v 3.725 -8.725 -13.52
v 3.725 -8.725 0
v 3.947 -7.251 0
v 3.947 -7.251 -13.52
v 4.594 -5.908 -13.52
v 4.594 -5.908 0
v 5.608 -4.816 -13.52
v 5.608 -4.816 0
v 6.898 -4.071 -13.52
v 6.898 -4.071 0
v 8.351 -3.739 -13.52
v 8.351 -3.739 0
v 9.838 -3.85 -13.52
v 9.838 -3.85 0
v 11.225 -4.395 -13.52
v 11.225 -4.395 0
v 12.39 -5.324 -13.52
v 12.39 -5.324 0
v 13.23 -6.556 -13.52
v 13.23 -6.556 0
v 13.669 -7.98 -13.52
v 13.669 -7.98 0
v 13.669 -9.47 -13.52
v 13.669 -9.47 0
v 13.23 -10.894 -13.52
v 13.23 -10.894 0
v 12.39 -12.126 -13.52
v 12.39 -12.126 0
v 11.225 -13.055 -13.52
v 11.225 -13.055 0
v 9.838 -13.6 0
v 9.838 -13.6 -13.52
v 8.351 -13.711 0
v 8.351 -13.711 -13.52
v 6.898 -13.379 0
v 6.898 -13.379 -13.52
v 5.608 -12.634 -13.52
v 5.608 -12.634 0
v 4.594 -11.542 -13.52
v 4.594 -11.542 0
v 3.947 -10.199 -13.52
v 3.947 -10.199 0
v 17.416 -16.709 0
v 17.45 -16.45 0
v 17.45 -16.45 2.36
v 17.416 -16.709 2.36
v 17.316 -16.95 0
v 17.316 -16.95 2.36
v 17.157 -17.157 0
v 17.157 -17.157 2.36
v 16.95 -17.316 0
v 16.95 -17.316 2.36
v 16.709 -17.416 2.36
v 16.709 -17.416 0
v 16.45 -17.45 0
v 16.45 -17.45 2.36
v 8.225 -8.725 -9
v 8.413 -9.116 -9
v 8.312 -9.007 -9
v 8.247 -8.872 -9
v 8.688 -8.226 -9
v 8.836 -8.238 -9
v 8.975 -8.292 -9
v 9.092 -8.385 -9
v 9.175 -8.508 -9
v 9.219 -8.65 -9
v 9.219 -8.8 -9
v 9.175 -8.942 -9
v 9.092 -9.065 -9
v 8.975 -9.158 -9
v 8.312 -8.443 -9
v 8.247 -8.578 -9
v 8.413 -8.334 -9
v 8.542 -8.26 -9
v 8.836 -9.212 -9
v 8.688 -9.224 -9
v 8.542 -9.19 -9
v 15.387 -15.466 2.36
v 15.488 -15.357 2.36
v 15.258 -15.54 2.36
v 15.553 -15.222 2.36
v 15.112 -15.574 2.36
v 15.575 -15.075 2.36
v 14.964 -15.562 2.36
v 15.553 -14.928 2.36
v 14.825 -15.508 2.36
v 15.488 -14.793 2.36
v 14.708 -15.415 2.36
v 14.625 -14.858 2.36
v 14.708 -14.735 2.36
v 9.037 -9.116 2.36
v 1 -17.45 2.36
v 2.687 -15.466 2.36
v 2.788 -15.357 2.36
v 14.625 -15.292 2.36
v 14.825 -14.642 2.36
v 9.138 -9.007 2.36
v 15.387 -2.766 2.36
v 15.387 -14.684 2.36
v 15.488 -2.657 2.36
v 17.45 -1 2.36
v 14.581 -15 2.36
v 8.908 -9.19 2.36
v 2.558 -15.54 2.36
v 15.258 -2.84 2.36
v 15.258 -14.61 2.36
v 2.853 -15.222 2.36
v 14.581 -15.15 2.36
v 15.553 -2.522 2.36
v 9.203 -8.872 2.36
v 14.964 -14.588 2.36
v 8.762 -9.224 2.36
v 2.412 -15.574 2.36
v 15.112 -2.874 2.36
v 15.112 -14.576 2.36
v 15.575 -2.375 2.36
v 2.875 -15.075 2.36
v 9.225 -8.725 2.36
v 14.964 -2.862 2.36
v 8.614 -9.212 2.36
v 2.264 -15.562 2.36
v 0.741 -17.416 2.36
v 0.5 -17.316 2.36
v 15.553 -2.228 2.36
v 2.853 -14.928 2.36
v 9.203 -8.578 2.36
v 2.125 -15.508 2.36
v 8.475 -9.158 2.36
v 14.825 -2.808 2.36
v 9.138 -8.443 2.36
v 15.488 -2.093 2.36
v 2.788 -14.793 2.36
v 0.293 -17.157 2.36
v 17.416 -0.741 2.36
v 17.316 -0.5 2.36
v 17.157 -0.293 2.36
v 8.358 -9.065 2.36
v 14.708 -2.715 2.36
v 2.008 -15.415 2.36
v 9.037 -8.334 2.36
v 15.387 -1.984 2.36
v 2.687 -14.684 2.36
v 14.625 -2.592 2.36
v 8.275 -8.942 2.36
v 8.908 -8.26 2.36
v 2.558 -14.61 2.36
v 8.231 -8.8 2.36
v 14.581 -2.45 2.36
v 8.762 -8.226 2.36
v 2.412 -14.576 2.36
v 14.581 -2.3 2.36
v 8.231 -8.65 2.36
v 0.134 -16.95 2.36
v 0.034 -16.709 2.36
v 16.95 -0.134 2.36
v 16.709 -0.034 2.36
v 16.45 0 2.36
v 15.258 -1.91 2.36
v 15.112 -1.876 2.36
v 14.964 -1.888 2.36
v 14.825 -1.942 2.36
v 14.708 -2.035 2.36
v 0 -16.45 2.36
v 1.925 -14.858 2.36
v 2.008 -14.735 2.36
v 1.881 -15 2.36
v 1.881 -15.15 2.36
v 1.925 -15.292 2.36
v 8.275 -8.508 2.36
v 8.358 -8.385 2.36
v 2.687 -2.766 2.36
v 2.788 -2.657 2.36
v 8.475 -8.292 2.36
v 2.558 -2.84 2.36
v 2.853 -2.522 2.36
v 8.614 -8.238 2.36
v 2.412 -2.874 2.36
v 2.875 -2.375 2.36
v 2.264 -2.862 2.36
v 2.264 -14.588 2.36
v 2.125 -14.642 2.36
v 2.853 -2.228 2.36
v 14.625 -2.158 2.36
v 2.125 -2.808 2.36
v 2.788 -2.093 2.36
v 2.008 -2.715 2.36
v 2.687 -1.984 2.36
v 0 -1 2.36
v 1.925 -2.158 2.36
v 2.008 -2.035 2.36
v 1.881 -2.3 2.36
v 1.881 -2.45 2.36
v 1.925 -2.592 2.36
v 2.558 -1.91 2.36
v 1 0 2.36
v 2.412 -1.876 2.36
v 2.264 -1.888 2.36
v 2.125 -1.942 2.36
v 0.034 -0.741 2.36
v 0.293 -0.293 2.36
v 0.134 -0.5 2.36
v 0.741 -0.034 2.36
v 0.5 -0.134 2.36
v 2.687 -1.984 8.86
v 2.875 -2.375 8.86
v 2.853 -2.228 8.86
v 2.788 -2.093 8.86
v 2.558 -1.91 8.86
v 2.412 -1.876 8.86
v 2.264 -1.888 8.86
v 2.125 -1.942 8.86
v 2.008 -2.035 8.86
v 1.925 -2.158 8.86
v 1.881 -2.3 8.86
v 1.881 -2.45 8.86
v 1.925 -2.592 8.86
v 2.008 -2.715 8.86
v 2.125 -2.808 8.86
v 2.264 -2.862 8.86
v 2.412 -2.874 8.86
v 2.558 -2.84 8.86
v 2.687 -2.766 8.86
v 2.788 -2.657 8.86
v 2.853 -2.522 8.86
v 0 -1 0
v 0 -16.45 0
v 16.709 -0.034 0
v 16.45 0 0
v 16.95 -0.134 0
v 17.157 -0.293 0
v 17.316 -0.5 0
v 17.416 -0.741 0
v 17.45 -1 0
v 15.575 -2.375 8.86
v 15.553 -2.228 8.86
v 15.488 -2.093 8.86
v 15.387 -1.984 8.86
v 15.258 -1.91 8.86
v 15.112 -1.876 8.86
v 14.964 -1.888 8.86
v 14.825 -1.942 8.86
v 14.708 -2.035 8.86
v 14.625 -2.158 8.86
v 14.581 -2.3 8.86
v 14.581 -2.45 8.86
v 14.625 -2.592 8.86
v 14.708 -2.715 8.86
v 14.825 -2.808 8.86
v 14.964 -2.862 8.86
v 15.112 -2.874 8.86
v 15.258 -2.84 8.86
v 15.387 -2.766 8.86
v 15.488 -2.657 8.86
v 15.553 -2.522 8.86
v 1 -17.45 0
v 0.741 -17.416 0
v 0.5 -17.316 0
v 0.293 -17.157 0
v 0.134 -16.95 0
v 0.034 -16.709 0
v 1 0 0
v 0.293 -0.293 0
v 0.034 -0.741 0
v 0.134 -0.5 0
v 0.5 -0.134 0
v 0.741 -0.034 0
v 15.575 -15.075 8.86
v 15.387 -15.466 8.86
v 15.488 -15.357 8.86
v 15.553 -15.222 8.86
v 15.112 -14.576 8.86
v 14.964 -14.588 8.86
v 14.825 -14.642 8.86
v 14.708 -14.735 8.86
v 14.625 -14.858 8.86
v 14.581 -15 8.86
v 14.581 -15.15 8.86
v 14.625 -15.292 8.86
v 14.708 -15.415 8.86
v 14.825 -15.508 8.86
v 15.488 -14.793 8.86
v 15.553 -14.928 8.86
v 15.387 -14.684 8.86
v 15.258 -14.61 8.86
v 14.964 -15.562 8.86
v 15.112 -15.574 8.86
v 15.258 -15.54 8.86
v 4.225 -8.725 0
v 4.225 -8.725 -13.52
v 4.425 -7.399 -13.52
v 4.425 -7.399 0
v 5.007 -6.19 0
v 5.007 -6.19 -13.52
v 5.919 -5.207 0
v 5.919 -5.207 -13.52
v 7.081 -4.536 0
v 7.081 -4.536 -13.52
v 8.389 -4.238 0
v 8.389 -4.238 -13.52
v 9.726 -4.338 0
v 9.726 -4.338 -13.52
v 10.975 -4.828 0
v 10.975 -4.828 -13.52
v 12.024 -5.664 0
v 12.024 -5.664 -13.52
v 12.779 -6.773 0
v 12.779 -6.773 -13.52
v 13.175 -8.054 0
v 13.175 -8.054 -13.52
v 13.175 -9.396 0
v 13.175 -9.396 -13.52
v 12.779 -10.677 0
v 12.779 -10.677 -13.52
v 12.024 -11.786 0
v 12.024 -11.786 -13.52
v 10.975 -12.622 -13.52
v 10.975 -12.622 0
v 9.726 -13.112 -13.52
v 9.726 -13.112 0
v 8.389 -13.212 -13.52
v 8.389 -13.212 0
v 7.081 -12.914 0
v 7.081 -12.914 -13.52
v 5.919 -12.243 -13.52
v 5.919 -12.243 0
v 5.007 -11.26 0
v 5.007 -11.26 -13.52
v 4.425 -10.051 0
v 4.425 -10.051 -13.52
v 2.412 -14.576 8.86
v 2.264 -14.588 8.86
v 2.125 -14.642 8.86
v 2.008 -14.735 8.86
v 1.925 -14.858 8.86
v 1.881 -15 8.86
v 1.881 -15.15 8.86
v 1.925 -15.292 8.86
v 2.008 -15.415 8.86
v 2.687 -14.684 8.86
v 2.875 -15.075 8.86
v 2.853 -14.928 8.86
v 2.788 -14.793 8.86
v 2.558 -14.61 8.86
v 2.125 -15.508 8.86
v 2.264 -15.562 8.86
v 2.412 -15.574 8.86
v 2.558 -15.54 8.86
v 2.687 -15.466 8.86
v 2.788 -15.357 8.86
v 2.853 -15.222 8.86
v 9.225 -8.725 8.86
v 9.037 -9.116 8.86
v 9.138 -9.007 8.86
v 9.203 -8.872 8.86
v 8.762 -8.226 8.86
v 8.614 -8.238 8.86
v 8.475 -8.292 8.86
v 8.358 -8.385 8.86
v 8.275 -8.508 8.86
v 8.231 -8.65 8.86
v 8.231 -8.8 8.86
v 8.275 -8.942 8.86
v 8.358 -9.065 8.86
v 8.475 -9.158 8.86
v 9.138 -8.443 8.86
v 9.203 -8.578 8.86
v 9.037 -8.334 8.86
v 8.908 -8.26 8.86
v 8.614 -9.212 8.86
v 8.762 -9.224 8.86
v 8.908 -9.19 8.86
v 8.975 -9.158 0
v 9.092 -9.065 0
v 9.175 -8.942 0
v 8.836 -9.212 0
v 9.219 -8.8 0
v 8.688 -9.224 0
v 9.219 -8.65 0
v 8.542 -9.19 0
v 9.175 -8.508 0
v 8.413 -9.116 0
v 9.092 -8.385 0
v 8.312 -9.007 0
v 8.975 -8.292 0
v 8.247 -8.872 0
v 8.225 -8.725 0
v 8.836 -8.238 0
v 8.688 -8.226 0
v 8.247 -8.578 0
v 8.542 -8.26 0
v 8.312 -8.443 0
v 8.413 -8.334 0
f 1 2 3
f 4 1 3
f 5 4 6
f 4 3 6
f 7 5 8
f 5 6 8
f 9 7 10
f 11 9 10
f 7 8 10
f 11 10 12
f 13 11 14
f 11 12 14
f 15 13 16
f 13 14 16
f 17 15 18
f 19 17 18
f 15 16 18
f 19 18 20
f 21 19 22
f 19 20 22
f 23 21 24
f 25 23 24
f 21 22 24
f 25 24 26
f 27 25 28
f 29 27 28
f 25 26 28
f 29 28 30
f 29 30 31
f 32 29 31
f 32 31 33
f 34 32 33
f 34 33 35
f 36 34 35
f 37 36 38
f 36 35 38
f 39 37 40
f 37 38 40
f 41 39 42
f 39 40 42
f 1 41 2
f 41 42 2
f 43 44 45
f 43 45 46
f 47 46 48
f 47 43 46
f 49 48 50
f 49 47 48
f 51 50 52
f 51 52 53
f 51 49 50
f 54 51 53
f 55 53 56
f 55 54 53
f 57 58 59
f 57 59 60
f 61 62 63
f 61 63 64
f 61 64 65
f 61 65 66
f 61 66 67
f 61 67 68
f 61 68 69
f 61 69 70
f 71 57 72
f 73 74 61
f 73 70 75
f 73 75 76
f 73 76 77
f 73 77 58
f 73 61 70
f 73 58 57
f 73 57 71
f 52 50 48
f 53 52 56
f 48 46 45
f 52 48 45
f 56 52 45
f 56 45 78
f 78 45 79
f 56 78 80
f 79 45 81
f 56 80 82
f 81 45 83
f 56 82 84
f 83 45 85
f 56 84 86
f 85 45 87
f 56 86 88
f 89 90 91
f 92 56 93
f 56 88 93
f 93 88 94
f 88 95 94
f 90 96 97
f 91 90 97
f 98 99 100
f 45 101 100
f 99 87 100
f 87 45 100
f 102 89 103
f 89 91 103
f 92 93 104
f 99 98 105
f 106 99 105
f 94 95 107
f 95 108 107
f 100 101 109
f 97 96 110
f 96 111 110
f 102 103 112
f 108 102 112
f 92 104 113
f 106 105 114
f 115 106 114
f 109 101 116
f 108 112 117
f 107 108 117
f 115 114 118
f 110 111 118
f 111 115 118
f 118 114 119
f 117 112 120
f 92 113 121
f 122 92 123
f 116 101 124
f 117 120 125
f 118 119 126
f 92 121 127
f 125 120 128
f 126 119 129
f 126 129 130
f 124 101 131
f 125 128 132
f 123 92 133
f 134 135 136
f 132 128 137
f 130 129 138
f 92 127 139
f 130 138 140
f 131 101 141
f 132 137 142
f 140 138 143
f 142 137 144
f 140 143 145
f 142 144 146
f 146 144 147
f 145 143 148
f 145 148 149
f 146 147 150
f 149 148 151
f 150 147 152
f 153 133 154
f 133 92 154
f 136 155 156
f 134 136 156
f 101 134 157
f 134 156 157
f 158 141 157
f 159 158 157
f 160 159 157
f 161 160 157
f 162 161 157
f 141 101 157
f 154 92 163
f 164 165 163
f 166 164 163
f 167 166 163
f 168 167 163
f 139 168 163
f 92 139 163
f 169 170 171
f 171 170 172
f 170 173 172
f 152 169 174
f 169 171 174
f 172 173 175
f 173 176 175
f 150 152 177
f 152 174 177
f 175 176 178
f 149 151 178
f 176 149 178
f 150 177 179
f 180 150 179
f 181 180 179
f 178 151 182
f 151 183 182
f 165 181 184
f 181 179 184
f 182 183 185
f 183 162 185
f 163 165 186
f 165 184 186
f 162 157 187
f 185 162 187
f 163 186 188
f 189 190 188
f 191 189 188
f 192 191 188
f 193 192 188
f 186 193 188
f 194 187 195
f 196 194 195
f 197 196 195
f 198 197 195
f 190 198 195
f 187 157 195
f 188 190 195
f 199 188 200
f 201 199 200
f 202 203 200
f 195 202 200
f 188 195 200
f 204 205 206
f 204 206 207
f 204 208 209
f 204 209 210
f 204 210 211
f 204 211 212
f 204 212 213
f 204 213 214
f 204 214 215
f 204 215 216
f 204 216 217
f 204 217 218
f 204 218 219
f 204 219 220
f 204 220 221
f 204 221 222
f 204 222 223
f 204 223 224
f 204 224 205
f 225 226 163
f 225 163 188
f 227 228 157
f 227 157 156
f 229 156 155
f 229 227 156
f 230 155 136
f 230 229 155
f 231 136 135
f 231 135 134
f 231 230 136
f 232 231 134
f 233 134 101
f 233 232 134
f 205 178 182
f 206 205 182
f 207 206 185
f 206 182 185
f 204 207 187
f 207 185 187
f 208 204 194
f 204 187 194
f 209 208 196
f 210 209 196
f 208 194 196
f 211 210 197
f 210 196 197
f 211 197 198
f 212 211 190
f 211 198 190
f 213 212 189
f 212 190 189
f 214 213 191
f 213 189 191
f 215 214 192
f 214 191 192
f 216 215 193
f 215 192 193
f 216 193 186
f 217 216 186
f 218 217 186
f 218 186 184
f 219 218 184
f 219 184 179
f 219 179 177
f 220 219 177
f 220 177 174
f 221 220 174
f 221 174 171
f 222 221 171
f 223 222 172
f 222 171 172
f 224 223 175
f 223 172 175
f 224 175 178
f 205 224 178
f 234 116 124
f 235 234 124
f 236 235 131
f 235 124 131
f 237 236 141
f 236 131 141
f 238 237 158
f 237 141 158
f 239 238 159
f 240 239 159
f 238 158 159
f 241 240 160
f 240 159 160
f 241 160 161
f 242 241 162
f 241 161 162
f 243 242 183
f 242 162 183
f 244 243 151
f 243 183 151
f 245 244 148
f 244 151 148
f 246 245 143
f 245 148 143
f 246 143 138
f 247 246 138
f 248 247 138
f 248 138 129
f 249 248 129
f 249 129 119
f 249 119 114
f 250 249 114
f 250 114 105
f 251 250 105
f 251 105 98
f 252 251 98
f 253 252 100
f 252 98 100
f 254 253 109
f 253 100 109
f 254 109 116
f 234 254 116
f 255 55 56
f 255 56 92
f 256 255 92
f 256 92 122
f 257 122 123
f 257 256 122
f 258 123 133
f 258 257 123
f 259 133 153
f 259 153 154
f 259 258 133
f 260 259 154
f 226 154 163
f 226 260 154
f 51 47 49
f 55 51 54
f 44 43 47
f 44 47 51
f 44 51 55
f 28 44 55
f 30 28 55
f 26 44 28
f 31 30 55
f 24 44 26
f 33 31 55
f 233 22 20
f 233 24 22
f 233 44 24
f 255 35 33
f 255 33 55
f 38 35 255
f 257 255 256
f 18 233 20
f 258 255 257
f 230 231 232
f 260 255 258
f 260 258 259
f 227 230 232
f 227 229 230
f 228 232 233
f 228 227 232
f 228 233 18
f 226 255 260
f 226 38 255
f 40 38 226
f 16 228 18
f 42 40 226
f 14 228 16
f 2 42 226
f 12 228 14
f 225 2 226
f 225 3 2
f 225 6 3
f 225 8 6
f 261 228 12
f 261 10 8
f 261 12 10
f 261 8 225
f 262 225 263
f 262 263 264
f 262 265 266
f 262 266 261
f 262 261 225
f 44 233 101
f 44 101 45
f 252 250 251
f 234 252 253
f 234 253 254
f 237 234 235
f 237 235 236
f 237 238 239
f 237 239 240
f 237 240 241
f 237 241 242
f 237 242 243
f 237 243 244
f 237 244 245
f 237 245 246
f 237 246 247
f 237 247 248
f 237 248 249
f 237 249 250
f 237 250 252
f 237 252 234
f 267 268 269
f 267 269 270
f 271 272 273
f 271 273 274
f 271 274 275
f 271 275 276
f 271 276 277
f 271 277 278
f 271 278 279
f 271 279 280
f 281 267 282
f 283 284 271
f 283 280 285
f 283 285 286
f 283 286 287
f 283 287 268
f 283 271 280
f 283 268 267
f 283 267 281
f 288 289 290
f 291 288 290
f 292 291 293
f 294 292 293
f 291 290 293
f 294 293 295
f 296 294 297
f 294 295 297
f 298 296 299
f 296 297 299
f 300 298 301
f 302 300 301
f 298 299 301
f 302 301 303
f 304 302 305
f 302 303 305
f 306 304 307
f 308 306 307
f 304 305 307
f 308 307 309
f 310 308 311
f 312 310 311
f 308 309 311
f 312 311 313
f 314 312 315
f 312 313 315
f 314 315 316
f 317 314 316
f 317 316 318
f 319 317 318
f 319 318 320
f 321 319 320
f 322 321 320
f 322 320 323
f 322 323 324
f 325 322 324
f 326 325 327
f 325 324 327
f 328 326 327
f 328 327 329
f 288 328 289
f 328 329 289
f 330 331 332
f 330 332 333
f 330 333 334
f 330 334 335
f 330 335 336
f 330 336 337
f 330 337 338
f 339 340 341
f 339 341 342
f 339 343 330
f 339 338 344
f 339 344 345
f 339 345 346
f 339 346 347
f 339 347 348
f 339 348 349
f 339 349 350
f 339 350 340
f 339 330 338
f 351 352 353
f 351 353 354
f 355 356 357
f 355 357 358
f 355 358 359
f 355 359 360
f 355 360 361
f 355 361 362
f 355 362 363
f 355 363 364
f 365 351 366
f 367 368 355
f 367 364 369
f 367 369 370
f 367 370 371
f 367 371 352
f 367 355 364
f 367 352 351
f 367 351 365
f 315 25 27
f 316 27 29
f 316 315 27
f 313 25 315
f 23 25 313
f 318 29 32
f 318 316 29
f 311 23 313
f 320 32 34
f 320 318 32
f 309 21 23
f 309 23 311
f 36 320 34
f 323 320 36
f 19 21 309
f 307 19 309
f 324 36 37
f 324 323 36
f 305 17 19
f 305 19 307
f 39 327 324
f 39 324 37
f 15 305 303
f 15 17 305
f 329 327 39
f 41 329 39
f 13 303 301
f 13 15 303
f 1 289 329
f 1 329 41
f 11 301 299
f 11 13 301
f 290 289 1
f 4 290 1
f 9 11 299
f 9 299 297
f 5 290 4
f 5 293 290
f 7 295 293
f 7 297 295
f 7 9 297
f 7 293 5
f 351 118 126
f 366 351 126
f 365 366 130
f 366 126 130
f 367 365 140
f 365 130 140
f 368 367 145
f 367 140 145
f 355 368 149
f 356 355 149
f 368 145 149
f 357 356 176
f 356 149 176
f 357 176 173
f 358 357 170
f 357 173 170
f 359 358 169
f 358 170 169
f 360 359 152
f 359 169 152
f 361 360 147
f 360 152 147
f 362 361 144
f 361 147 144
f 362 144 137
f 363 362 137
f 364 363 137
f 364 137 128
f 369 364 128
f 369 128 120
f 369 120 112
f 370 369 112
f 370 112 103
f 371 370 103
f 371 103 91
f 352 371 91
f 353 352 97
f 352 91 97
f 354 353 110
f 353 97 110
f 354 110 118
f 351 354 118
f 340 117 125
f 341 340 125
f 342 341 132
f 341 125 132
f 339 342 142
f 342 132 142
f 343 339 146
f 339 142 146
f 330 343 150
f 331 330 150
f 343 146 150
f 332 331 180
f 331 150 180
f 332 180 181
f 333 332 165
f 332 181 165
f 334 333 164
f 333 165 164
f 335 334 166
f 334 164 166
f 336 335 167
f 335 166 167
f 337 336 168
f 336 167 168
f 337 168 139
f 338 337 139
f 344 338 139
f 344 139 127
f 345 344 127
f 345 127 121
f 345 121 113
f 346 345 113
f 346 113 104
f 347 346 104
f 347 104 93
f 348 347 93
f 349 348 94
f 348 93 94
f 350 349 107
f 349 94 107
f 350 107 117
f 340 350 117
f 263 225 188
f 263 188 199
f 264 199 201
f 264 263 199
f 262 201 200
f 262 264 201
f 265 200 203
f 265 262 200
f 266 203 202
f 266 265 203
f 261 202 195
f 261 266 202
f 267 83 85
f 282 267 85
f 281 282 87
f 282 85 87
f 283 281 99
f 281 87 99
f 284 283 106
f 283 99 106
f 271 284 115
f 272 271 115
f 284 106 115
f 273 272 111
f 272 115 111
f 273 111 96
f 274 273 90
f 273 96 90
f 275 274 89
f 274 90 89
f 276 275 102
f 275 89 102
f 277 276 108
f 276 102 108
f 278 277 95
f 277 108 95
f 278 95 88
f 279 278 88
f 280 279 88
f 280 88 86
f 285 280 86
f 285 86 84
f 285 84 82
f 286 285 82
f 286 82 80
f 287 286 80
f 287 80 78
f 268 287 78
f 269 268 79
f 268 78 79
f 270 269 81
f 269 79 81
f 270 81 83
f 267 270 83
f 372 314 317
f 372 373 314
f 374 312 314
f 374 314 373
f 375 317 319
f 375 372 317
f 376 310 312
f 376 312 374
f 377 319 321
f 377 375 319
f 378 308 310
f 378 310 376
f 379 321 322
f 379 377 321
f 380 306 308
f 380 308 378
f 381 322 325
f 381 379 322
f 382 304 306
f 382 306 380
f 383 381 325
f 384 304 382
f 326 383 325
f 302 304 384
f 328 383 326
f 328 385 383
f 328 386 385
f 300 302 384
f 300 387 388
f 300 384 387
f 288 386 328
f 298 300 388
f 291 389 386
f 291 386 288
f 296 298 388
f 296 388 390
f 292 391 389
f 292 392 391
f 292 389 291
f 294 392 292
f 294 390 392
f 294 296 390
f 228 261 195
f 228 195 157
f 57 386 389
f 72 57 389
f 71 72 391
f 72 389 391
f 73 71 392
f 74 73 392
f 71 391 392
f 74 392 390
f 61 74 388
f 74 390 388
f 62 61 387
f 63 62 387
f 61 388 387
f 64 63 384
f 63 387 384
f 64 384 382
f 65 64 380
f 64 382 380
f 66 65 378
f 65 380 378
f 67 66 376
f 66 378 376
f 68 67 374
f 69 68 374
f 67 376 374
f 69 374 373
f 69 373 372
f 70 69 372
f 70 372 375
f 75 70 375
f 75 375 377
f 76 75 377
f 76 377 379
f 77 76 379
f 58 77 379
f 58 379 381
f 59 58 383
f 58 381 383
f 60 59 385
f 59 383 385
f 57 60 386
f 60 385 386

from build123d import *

# Parameters (mm, degrees)
EXTRUDE1_DEPTH     = 2.36
SKETCH2_R          = 5
EXTRUDE2_DEPTH     = 13.52
SKETCH3_R          = 4.5
CUT_EXTRUDE1_DEPTH = 13.52
SKETCH4_R          = 0.5
EXTRUDE3_DEPTH     = 6.5
SKETCH5_R          = 0.5
EXTRUDE4_DEPTH     = 9


with BuildPart() as part:
    # Sketch1 → Extrude1 (new body)
    with BuildSketch(Plane.XY):
        with BuildLine():
            Line((1, 0), (16.45, 0))
            ThreePointArc((16.45, 0), (17.157106781, -0.292893219), (17.45, -1))
            Line((17.45, -1), (17.45, -16.45))
            ThreePointArc((17.45, -16.45), (17.157106781, -17.157106781), (16.45, -17.45))
            Line((16.45, -17.45), (1, -17.45))
            ThreePointArc((1, -17.45), (0.292893219, -17.157106781), (0, -16.45))
            Line((0, -16.45), (0, -1))
            ThreePointArc((0, -1), (0.292893219, -0.292893219), (1, 0))
        make_face()
    extrude(amount=EXTRUDE1_DEPTH)

    # Sketch2 → Extrude2 (add)
    with BuildSketch(Plane(origin=(0, 0, 0), x_dir=(-1, 0, 0), z_dir=(0, 0, -1))):
        with Locations((-8.725, -8.725)):
            Circle(SKETCH2_R)
    extrude(amount=EXTRUDE2_DEPTH)

    # Sketch3 → Cut-Extrude1 (cut)
    with BuildSketch(Plane(origin=(0, 0, -13.52), x_dir=(-1, 0, 0), z_dir=(0, 0, -1))):
        with Locations((-8.725, -8.725)):
            Circle(SKETCH3_R)
    extrude(amount=-CUT_EXTRUDE1_DEPTH, mode=Mode.SUBTRACT)

    # Sketch4 → Extrude3 (add)
    with BuildSketch(Plane.XY.offset(2.36)):
        with Locations((8.725, -8.725)):
            Circle(SKETCH4_R)
        with Locations((15.075, -2.375)):
            Circle(SKETCH4_R)
        with Locations((2.375, -2.375)):
            Circle(SKETCH4_R)
        with Locations((2.375, -15.075)):
            Circle(SKETCH4_R)
        with Locations((15.075, -15.075)):
            Circle(SKETCH4_R)
    extrude(amount=EXTRUDE3_DEPTH)

    # Sketch5 → Extrude4 (add)
    with BuildSketch(Plane(origin=(0, 0, 0), x_dir=(-1, 0, 0), z_dir=(0, 0, -1))):
        with Locations((-8.725, -8.725)):
            Circle(SKETCH5_R)
    extrude(amount=EXTRUDE4_DEPTH)


solid = part.part
